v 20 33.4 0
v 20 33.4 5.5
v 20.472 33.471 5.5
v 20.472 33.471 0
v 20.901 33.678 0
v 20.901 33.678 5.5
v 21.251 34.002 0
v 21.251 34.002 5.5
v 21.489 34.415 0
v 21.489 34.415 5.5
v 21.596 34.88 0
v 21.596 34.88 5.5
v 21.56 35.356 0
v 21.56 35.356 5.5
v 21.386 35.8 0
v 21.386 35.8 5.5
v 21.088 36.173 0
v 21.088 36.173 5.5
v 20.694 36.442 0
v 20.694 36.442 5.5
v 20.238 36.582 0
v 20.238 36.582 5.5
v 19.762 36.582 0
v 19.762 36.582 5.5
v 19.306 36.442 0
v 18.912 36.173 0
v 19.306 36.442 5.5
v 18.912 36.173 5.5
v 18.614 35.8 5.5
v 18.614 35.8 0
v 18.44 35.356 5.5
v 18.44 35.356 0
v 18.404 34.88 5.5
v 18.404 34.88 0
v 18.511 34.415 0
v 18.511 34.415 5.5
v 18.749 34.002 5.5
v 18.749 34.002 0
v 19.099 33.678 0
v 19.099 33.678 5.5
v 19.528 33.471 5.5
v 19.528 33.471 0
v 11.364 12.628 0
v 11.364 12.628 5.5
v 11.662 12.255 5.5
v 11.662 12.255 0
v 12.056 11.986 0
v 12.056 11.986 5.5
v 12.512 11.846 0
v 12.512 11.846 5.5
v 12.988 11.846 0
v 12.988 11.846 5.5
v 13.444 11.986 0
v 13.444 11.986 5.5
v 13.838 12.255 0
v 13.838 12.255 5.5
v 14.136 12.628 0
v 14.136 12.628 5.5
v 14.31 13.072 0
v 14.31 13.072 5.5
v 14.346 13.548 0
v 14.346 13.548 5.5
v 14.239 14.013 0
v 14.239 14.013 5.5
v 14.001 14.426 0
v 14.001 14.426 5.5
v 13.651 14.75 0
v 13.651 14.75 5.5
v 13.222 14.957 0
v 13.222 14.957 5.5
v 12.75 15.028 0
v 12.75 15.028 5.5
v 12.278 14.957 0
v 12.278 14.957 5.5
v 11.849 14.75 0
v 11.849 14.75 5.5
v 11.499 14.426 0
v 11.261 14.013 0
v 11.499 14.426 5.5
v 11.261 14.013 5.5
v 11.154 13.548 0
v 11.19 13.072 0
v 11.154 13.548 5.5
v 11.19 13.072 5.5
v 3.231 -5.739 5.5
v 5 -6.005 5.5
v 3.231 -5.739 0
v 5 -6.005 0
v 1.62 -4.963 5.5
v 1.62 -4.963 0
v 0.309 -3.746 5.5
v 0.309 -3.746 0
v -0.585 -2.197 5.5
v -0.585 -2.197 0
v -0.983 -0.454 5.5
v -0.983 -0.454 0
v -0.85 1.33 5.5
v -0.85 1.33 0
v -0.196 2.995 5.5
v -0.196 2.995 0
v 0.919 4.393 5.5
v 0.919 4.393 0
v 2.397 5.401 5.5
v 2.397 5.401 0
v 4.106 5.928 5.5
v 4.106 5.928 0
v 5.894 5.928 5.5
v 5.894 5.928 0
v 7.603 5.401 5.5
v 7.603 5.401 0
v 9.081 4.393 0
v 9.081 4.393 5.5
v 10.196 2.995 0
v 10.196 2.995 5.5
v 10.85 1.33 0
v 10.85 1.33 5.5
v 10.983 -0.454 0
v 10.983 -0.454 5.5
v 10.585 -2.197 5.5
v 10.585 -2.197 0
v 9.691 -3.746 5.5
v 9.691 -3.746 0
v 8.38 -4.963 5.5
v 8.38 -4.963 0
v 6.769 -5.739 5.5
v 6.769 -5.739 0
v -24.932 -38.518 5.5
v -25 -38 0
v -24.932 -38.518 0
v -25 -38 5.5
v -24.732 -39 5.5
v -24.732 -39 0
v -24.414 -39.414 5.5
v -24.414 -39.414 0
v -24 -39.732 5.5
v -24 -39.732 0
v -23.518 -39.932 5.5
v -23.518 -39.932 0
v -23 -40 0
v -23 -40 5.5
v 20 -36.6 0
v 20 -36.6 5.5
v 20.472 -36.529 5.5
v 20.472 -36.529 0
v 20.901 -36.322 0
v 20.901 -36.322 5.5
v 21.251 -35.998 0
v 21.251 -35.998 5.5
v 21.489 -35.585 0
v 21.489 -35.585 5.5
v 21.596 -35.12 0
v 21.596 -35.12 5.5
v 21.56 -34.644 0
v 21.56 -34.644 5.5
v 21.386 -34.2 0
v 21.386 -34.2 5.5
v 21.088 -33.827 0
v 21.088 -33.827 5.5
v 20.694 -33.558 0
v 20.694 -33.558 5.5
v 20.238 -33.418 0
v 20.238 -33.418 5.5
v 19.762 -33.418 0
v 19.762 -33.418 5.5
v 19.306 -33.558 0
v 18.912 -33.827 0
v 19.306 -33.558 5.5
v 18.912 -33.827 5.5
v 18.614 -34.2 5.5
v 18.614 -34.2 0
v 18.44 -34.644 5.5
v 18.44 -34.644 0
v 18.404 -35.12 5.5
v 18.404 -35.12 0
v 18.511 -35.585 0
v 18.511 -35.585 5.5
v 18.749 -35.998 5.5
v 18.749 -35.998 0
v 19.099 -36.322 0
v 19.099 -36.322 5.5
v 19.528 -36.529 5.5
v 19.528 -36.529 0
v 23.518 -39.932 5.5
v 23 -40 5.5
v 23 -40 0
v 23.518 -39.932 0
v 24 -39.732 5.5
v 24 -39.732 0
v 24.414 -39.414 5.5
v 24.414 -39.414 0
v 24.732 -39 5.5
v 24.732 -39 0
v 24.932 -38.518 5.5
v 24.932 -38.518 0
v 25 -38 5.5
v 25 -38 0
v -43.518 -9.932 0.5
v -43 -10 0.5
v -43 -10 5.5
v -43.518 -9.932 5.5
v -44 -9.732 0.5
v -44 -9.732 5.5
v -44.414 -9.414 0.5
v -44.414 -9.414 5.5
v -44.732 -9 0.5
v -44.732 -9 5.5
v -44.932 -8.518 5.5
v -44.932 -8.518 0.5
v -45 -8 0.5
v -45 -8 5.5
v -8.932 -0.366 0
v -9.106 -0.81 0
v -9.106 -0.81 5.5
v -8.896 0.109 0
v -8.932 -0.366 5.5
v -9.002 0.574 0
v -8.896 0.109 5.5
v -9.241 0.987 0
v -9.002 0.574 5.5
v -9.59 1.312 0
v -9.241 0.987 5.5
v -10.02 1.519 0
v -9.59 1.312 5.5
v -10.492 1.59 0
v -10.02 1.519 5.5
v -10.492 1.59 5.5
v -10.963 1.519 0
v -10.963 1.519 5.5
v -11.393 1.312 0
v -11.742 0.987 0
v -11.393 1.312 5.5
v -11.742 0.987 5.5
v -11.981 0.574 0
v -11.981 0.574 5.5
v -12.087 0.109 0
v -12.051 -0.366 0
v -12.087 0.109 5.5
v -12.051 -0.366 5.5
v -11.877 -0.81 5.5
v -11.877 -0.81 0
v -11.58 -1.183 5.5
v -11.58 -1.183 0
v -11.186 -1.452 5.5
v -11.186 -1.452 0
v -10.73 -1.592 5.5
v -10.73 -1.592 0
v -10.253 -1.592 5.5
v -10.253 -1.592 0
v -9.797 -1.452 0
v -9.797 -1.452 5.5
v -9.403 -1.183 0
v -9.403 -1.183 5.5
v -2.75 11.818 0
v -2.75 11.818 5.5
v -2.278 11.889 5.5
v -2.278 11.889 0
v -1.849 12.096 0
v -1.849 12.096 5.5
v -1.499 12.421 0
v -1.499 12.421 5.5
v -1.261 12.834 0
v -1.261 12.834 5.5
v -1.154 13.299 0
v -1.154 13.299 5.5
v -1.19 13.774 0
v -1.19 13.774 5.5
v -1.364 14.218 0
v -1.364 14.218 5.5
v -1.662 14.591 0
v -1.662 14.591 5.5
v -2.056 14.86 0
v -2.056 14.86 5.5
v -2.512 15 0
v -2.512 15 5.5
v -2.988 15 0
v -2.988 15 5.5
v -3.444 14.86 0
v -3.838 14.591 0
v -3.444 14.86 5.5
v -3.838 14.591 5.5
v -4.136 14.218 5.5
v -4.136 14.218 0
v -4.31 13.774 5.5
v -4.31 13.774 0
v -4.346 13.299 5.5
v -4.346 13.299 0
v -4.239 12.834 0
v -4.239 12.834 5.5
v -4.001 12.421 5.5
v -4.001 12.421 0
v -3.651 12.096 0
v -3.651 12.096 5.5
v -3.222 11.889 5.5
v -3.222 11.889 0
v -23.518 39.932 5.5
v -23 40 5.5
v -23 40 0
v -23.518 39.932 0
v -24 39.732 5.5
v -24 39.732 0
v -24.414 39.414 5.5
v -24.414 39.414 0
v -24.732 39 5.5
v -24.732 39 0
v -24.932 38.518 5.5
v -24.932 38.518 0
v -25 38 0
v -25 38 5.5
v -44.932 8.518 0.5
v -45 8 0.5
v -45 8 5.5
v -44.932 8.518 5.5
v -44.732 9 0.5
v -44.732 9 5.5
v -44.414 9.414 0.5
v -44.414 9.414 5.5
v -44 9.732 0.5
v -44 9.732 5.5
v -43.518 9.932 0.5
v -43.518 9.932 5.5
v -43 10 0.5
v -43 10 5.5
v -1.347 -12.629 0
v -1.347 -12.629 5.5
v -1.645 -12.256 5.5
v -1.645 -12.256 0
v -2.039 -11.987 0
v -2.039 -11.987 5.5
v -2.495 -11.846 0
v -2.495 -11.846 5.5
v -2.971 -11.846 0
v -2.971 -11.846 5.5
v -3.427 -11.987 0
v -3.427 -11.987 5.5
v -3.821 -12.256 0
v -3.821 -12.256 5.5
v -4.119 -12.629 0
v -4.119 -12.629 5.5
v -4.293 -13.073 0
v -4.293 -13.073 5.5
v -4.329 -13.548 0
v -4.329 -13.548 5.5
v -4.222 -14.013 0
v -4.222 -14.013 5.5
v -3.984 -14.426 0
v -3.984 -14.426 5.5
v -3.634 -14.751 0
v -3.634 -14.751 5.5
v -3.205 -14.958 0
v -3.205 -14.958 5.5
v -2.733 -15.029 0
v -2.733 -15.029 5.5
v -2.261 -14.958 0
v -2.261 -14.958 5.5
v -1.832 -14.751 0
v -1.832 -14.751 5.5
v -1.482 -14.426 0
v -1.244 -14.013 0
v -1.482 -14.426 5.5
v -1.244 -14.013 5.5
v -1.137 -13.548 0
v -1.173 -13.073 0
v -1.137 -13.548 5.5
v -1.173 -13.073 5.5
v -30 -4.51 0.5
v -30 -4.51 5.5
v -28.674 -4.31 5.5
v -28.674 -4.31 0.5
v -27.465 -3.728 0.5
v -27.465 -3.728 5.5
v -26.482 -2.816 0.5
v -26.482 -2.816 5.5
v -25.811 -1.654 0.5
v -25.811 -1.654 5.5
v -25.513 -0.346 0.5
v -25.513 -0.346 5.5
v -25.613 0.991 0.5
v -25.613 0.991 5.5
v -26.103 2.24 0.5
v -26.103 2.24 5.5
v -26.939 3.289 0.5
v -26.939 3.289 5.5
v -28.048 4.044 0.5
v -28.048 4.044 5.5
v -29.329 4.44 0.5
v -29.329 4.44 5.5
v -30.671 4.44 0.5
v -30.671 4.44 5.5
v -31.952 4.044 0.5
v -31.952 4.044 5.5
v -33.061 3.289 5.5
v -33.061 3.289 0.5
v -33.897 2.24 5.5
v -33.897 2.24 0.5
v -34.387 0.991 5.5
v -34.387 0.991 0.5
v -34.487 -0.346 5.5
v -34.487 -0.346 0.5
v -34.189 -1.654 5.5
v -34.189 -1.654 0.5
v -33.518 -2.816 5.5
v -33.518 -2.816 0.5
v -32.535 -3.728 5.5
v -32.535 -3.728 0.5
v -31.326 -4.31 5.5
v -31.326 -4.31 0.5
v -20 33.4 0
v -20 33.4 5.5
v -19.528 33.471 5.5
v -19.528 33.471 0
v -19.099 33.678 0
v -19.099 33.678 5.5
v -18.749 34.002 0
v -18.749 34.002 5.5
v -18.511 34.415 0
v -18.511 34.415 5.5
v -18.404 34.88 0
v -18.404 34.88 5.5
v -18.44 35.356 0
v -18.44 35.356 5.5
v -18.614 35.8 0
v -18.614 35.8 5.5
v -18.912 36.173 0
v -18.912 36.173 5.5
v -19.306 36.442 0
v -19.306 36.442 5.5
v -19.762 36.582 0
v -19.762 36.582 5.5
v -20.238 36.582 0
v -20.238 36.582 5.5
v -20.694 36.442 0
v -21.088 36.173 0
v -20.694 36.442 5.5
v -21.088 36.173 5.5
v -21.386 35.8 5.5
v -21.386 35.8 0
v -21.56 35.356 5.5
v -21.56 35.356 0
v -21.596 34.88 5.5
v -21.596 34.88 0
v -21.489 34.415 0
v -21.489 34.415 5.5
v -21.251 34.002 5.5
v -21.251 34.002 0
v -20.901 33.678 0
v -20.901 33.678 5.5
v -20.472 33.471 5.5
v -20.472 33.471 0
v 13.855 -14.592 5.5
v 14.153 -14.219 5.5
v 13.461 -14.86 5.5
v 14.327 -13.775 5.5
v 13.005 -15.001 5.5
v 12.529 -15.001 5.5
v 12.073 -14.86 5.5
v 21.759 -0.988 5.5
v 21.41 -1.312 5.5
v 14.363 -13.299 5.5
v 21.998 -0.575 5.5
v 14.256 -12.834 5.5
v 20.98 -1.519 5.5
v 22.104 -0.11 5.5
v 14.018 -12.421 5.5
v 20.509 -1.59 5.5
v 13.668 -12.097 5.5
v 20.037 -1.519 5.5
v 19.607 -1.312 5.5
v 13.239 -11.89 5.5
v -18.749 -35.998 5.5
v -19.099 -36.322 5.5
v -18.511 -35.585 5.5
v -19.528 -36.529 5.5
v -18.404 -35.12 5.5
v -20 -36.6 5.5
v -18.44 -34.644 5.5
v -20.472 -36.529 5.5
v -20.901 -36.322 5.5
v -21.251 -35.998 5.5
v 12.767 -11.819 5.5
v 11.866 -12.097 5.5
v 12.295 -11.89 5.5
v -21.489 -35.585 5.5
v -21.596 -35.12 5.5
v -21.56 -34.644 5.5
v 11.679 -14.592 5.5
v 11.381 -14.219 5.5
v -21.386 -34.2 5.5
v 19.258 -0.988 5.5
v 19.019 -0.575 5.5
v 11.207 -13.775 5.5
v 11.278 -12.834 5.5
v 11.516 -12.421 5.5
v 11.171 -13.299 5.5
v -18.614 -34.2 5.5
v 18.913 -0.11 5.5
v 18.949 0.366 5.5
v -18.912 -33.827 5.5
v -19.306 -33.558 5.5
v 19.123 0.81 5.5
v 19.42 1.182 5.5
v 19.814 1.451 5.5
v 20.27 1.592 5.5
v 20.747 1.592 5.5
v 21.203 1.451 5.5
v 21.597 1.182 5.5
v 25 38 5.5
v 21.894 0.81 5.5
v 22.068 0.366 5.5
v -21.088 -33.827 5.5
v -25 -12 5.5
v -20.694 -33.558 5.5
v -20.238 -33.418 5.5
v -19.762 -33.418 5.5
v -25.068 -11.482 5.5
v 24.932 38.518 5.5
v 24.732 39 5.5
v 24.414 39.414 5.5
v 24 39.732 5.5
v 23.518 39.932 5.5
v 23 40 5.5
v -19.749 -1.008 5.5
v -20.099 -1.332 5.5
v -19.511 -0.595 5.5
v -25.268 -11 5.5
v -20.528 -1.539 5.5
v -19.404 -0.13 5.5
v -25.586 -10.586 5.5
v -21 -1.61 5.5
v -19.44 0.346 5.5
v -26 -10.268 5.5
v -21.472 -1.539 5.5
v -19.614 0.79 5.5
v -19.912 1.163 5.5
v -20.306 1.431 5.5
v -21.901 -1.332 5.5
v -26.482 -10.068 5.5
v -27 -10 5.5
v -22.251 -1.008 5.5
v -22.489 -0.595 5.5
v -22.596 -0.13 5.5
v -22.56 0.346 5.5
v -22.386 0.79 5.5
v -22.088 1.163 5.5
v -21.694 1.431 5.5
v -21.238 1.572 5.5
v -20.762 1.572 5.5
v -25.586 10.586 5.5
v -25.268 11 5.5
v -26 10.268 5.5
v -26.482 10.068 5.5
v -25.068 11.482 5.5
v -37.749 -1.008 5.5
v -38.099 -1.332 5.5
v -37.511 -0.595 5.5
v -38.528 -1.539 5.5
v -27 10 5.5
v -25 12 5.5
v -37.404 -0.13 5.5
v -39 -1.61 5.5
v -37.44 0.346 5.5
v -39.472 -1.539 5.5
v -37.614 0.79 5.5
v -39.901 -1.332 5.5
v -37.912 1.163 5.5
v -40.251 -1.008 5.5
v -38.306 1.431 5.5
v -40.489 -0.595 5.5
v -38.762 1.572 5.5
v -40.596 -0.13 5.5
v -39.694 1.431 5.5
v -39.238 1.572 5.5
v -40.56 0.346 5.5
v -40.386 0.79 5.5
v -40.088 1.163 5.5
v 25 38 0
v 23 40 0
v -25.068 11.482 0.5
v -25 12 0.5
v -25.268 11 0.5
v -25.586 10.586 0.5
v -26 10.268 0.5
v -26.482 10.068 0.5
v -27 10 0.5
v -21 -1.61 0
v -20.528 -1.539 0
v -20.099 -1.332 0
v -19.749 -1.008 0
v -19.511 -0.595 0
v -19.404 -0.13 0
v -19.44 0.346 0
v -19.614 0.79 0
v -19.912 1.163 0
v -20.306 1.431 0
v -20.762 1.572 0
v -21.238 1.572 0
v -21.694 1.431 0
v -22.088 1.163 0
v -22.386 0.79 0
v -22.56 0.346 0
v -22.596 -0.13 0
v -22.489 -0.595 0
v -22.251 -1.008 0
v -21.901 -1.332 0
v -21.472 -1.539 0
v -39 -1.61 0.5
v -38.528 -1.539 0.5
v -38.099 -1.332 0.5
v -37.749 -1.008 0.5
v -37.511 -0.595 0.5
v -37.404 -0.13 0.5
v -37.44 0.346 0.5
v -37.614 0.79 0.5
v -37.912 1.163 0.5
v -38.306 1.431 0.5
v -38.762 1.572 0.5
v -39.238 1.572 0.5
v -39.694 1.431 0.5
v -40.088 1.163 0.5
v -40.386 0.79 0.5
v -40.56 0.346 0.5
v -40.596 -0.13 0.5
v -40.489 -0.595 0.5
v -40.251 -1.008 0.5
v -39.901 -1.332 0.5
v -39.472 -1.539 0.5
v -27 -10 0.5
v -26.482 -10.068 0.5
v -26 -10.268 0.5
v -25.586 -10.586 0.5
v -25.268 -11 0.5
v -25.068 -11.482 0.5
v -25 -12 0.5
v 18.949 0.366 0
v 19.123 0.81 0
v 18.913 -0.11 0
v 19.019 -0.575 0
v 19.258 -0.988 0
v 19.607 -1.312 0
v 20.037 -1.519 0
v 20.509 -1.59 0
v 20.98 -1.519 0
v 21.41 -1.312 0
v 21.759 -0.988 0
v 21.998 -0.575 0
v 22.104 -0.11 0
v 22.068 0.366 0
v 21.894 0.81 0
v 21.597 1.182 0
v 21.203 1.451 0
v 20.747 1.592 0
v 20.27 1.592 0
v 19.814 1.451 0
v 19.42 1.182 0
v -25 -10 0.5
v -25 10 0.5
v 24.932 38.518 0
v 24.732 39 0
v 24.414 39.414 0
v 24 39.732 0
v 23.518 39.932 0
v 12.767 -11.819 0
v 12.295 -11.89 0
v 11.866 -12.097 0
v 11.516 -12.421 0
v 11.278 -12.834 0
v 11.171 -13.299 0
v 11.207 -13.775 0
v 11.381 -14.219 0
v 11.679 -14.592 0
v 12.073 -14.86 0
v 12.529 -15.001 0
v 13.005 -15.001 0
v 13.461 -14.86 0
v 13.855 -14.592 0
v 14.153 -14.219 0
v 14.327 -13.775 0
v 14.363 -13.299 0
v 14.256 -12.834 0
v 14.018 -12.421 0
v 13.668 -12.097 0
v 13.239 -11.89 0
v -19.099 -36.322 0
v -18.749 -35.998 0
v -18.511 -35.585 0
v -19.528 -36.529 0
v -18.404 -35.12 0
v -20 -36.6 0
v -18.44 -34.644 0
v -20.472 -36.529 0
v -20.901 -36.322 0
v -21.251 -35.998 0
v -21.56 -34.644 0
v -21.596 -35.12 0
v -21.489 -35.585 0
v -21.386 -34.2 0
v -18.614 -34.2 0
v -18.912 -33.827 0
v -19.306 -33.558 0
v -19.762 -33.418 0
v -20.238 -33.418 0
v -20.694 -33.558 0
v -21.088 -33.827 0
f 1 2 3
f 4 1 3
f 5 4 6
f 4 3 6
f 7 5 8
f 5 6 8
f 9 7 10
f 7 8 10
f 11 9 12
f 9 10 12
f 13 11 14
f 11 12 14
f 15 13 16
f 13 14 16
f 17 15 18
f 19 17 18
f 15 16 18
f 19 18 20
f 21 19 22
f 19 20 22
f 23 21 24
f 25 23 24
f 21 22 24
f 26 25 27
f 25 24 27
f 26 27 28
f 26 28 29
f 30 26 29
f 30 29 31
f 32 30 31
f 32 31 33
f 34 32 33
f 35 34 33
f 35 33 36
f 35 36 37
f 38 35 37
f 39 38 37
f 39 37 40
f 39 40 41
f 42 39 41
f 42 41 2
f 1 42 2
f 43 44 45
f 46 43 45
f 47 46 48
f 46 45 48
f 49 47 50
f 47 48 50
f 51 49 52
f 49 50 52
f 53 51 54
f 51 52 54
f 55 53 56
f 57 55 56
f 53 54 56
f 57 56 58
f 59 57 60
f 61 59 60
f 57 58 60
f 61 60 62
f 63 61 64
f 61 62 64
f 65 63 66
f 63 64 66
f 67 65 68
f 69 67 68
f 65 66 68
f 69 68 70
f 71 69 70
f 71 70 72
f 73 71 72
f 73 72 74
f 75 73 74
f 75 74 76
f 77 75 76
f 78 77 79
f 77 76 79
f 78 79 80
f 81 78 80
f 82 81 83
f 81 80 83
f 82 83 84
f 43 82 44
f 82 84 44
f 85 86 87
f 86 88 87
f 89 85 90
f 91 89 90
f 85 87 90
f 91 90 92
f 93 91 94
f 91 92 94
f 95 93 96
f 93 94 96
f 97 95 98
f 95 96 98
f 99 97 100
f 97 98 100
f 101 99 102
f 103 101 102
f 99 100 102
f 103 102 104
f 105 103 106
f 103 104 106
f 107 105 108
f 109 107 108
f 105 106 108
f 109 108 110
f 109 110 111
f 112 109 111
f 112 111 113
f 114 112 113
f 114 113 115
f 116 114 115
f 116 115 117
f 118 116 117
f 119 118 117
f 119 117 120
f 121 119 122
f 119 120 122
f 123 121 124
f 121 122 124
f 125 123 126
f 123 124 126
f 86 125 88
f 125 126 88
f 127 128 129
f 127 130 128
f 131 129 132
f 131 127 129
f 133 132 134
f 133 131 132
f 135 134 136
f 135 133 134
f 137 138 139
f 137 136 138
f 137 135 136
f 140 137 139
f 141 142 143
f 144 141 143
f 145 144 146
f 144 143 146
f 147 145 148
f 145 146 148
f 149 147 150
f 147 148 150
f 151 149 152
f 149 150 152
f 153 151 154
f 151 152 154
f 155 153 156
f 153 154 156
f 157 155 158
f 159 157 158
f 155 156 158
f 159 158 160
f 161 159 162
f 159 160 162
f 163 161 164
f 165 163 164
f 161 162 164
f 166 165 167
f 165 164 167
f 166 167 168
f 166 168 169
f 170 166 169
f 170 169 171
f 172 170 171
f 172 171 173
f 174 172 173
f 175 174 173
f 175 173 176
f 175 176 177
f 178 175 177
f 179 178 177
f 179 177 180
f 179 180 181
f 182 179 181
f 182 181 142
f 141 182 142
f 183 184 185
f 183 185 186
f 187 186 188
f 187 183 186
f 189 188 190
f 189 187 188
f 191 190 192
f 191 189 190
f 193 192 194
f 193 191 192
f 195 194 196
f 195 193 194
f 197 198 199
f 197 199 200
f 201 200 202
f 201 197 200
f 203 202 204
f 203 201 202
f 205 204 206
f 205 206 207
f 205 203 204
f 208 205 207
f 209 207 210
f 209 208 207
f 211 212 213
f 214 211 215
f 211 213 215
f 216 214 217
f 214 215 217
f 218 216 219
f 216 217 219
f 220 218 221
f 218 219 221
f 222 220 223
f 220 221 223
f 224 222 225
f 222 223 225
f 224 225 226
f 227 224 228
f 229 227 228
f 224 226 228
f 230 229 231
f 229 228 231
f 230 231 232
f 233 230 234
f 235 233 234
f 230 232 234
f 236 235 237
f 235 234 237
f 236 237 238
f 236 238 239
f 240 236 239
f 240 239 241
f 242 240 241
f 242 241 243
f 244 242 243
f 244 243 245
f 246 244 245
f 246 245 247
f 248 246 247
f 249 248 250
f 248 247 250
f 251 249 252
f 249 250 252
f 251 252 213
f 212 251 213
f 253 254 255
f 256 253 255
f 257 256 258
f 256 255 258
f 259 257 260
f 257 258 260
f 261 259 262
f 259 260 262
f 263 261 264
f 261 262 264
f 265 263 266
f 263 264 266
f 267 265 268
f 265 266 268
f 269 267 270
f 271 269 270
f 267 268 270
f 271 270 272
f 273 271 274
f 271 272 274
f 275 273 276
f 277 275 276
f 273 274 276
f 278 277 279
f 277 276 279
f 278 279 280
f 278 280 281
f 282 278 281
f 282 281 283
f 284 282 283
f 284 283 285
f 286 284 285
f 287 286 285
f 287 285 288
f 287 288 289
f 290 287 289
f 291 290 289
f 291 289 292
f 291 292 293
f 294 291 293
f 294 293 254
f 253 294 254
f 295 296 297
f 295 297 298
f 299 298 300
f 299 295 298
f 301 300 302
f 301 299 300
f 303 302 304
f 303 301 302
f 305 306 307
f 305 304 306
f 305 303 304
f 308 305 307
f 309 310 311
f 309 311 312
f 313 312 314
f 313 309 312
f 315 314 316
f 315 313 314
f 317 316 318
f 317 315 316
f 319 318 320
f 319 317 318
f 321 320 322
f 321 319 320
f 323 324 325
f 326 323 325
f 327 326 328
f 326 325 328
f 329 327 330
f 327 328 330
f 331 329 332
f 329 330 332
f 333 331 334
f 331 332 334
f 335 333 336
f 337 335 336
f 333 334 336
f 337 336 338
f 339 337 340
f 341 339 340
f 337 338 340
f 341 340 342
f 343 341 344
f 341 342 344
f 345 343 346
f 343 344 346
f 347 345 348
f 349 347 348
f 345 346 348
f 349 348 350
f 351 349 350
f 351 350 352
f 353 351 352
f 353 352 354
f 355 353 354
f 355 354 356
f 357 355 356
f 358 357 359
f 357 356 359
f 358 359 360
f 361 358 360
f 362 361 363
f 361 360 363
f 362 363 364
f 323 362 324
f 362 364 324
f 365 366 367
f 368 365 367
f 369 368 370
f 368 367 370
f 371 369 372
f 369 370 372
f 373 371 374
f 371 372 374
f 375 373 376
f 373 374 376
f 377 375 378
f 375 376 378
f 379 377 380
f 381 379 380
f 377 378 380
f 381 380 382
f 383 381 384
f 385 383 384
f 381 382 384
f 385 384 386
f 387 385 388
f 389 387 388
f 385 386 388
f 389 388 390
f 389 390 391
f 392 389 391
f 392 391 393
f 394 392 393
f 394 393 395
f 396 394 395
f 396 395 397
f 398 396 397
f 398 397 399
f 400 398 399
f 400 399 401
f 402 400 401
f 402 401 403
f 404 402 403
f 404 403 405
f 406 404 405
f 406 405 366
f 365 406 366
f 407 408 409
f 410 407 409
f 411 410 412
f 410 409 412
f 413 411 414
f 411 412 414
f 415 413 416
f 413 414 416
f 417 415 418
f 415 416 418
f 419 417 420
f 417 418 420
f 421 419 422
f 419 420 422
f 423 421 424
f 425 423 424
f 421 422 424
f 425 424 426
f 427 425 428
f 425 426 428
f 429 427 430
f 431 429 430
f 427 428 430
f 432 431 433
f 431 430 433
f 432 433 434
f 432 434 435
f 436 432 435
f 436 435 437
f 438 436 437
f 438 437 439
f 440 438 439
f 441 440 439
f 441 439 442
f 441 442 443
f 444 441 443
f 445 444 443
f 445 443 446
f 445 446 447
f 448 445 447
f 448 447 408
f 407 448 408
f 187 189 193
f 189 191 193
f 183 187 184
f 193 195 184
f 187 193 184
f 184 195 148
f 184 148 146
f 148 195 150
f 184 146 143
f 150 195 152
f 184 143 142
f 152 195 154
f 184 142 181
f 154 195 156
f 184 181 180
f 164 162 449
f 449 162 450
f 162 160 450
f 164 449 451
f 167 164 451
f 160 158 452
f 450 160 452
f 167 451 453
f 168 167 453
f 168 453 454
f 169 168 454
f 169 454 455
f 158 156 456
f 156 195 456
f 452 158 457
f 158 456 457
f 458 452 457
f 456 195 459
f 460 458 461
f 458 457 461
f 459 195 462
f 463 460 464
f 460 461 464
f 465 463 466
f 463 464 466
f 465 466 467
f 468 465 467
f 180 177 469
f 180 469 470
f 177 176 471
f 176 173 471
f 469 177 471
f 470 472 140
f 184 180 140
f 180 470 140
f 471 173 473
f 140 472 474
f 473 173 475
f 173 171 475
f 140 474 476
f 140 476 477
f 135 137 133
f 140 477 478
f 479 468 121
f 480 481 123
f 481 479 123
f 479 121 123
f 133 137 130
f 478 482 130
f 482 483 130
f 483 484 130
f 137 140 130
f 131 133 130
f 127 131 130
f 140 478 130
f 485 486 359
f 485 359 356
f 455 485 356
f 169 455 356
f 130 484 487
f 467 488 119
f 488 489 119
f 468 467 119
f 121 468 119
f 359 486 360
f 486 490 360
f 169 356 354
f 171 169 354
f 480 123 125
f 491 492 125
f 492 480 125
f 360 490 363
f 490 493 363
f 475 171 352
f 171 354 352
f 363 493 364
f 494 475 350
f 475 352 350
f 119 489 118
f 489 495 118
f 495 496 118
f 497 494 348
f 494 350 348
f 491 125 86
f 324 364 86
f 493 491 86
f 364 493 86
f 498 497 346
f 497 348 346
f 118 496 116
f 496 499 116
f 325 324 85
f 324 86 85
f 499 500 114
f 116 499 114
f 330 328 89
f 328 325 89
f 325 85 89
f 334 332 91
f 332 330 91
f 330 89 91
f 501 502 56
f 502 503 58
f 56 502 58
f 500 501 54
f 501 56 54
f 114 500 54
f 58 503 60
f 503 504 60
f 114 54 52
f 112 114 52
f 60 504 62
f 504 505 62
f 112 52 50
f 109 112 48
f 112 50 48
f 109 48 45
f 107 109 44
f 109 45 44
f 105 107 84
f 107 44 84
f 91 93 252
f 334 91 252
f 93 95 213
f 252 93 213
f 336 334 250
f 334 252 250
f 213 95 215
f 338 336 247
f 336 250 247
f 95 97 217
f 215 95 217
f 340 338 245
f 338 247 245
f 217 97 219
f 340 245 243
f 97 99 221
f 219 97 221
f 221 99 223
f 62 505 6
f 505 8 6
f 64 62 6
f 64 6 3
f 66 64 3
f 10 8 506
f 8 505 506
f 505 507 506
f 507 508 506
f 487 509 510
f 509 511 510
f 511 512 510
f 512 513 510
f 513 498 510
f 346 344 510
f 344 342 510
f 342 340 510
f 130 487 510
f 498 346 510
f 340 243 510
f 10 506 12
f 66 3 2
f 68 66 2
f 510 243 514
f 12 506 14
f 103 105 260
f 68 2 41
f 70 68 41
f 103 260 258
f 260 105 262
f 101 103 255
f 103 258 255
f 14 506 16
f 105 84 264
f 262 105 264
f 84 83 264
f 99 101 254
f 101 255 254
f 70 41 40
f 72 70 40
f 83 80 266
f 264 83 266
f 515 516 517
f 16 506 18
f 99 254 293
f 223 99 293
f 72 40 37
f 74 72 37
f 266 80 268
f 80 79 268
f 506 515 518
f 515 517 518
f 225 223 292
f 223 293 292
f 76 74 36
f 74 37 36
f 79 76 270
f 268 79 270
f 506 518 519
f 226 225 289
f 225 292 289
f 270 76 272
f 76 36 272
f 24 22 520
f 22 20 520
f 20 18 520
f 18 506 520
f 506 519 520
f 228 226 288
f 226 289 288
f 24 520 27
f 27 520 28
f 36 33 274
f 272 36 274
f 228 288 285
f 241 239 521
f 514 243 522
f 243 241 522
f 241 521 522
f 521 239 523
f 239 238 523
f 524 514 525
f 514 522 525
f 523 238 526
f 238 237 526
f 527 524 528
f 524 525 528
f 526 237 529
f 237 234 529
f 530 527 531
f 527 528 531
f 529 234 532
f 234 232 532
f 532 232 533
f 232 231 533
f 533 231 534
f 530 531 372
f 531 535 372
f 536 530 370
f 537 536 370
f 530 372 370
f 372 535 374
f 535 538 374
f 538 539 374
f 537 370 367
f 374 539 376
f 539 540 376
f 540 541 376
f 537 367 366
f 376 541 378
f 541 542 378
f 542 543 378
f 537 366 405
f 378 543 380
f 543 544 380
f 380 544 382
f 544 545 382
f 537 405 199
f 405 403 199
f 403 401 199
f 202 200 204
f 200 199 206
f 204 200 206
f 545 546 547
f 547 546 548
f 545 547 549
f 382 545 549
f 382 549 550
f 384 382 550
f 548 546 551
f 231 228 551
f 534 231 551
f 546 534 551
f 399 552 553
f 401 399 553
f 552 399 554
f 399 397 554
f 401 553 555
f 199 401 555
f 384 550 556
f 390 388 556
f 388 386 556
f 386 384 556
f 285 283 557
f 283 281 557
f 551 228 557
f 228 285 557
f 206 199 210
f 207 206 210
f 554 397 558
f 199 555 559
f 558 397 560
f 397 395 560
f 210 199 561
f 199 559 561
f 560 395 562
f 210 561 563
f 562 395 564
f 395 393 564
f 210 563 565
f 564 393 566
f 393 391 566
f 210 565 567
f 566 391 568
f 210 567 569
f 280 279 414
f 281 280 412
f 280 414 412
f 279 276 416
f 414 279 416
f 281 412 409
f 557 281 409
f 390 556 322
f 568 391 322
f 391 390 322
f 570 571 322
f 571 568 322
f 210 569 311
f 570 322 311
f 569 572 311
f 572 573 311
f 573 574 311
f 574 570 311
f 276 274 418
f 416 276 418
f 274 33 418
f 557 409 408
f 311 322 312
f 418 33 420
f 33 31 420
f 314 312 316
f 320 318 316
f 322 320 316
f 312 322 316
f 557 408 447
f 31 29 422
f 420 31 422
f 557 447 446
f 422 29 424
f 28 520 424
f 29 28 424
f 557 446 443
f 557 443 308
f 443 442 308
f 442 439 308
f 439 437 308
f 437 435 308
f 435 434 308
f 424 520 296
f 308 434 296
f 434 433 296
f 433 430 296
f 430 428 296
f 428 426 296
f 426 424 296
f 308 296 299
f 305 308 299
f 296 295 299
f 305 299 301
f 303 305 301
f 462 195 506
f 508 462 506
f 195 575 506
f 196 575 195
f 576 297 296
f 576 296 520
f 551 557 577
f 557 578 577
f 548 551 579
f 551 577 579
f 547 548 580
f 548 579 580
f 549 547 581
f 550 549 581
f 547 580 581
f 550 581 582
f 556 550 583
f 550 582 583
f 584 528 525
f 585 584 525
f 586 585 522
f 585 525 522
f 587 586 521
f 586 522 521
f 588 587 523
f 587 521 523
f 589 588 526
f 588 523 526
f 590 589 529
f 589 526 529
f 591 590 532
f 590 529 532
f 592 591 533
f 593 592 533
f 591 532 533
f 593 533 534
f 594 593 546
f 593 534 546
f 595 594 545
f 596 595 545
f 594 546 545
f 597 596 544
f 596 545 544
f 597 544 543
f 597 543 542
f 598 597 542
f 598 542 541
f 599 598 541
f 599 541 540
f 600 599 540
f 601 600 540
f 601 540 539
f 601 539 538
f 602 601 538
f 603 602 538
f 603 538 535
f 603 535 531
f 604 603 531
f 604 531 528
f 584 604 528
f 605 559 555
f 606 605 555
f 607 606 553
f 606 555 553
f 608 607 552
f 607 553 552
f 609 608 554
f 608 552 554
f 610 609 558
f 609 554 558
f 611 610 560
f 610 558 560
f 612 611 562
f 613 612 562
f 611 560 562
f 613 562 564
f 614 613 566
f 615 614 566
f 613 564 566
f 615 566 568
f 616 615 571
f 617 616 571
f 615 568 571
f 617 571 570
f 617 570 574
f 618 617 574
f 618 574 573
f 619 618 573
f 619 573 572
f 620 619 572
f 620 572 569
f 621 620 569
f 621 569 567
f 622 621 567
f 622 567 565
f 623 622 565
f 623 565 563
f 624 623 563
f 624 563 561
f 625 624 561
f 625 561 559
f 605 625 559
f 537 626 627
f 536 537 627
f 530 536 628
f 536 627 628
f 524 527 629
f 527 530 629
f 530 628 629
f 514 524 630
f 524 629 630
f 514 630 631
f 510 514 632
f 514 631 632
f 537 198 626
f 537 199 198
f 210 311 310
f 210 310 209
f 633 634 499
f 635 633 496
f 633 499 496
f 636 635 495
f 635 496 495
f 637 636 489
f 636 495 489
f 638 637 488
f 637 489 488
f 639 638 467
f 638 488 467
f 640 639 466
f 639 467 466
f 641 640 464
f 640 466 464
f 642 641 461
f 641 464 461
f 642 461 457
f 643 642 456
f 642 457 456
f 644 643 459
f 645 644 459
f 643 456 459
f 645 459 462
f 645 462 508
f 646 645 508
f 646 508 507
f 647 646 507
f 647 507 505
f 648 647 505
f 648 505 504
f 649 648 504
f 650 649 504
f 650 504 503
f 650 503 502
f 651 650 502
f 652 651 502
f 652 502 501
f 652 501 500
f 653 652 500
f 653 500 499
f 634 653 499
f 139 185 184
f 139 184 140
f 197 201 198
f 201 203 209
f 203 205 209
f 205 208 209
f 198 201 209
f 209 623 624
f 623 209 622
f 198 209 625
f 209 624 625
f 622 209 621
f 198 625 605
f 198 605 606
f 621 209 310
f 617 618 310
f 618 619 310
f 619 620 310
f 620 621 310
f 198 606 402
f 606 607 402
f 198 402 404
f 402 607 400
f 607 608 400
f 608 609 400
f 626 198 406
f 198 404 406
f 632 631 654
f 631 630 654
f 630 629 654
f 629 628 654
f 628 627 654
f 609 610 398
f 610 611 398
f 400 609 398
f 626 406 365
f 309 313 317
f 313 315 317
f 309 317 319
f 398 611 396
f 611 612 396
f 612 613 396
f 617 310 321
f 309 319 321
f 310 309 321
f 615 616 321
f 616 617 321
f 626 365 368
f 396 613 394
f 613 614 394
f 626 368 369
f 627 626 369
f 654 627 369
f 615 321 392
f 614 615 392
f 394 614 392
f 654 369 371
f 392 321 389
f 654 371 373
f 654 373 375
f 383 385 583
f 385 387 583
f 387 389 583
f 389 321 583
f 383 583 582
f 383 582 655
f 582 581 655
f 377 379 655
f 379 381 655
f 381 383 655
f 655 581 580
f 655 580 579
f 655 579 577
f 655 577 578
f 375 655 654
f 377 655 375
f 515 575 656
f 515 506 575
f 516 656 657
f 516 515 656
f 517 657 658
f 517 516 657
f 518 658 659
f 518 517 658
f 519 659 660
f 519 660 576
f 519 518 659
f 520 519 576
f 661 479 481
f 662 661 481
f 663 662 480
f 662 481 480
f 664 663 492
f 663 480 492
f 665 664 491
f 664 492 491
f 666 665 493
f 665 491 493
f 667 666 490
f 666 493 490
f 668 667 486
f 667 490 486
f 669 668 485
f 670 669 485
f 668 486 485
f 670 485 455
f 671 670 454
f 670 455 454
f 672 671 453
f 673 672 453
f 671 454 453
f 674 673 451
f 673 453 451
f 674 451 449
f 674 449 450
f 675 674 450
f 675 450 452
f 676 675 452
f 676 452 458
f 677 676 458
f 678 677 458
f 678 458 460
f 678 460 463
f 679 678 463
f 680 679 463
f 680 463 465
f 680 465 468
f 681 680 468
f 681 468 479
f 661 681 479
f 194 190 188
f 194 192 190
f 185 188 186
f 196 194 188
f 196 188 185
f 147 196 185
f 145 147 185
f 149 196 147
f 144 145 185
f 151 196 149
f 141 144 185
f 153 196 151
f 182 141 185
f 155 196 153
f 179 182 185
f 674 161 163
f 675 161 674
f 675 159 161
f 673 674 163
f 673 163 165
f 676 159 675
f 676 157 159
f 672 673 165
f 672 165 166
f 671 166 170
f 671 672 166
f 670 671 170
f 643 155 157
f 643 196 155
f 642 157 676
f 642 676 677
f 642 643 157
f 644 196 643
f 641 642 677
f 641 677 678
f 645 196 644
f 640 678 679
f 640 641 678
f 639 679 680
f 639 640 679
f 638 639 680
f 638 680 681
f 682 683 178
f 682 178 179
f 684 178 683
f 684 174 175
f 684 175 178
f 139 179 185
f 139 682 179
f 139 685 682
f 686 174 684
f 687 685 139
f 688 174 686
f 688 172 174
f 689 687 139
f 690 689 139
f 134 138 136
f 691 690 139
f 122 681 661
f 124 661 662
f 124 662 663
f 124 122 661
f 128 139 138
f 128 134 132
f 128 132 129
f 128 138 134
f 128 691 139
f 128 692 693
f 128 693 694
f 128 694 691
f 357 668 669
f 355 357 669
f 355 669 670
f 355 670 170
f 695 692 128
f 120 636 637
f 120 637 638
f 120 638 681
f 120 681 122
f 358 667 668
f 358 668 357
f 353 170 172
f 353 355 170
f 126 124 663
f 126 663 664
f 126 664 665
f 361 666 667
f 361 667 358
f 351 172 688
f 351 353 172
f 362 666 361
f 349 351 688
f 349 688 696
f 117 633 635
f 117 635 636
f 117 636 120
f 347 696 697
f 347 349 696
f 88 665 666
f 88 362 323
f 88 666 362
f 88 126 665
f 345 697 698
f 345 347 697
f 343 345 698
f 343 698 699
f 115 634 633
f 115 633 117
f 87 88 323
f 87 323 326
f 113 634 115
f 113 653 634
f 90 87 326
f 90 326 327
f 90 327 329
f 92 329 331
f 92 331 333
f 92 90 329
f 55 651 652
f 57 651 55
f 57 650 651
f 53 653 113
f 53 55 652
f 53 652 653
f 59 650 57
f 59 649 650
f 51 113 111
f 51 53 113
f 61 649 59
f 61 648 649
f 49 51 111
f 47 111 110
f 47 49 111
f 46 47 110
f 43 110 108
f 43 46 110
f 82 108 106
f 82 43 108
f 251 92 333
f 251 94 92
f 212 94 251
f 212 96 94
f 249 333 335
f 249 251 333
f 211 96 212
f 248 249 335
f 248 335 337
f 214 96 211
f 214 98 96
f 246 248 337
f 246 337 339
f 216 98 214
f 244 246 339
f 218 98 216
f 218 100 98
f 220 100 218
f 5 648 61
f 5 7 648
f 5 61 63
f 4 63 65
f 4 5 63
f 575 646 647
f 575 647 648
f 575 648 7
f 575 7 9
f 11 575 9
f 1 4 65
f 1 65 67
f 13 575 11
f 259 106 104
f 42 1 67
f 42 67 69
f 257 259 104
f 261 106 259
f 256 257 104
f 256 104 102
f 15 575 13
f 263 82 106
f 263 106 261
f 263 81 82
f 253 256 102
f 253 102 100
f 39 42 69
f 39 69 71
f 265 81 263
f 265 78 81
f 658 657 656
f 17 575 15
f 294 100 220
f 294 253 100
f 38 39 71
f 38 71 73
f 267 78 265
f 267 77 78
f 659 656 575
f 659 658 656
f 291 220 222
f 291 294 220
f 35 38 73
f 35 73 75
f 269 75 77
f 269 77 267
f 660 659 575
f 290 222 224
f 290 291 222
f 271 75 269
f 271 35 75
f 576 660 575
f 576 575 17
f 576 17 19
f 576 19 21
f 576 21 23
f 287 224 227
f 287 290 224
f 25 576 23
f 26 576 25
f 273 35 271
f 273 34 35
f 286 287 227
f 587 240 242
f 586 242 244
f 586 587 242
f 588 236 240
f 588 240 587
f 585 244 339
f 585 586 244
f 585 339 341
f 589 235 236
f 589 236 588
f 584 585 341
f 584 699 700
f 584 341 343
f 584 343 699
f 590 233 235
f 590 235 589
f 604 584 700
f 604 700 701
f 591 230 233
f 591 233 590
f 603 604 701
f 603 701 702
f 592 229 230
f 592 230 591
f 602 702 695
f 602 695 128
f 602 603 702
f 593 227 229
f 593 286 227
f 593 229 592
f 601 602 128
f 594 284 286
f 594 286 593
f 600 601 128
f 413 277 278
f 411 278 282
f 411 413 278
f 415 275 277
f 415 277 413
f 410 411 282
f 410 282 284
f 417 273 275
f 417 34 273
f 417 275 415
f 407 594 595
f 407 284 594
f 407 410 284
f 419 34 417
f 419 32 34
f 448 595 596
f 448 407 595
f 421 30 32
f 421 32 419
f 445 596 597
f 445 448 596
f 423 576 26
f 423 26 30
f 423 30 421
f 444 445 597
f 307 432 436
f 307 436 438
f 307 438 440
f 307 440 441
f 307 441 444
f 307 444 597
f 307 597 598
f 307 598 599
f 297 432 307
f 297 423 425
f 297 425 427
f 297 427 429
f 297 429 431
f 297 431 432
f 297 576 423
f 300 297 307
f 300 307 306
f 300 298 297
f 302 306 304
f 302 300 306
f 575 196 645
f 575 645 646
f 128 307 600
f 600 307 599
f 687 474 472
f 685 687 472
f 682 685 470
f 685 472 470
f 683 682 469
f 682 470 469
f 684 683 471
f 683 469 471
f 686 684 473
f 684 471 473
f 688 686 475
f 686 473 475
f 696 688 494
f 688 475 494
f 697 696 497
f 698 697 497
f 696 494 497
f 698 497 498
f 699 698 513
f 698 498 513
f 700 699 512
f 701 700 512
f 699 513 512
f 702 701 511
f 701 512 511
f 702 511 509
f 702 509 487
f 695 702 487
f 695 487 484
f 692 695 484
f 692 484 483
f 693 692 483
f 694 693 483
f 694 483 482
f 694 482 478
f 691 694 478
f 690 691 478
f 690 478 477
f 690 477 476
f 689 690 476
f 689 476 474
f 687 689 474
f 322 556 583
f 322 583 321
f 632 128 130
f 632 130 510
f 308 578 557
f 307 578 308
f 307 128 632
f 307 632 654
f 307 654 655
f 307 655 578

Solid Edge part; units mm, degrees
sketch "Sketch1" plane through (0, 0, 0) normal (0, 0, 1) x (1, 0, 0)
  line L0 (25, -40) -> (-25, -40)
  line L1 (-25, -40) -> (-25, 40)
  line L2 (-25, 40) -> (25, 40)
  line L3 (25, 40) -> (25, -40)
  dimension "D1" = 50
  dimension "D2" = 80
extrude "Protrusion1" add sketch "Sketch1" along normal blind 5.5
hole "Hole_1" at (5, -0.0052, 5.5) direction (0, 0, -1) diameter 12 depth 140
hole "Hole_2" at (-2.75, 13.4182, 5.5) direction (0, 0, -1) diameter 3.2 end through all
pattern_circular "Pattern1" count 6 over 360 about axis through (5.0085, -0.0003, 5.5) along (0, 0, -1) of "Hole_2"
hole "Hole_8" at (-20, -35, 5.5) direction (0, 0, -1) diameter 3.2 end through all
hole "Hole6" at (-20, 35, 5.5) direction (0, 0, -1) diameter 3.2 end through all
hole "Hole7" at (20, 35, 5.5) direction (0, 0, -1) diameter 3.2 end through all
hole "Hole8" at (20, -35, 5.5) direction (0, 0, -1) diameter 3.2 end through all
fillet "Round_1" radius 2 4 edges at (25, 40, 2.75) (-25, 40, 2.75) (-25, -40, 2.75) (25, -40, 2.75)
sketch "Sketch2" plane through (0, 0, 5.5) normal (0, 0, 1) x (-1, 0, 0)
  line L0 (25, -10) -> (45, -10)
  line L1 (45, -10) -> (45, 10)
  line L2 (45, 10) -> (25, 10)
  line L3 (25, 10) -> (25, -10)
  dimension "D1" = 20
  dimension "D2" = 20
extrude "ExtrudedProtrusion_2" add sketch "Sketch2" against normal blind 5
hole "Hole_12" at (-30, -0.0101, 5.5) direction (0, 0, -1) diameter 9 end up to next
hole "Hole_13" at (-39, -0.0101, 5.5) direction (0, 0, -1) diameter 3.2 end up to next
hole "Hole9" at (-21, -0.0101, 5.5) direction (0, 0, -1) diameter 3.2 end up to next
fillet "Round_2" radius 2 4 edges at (-25, -10, 3) (-45, -10, 3) (-45, 10, 3) (-25, 10, 3)
properties material "木材, アッシュ"
